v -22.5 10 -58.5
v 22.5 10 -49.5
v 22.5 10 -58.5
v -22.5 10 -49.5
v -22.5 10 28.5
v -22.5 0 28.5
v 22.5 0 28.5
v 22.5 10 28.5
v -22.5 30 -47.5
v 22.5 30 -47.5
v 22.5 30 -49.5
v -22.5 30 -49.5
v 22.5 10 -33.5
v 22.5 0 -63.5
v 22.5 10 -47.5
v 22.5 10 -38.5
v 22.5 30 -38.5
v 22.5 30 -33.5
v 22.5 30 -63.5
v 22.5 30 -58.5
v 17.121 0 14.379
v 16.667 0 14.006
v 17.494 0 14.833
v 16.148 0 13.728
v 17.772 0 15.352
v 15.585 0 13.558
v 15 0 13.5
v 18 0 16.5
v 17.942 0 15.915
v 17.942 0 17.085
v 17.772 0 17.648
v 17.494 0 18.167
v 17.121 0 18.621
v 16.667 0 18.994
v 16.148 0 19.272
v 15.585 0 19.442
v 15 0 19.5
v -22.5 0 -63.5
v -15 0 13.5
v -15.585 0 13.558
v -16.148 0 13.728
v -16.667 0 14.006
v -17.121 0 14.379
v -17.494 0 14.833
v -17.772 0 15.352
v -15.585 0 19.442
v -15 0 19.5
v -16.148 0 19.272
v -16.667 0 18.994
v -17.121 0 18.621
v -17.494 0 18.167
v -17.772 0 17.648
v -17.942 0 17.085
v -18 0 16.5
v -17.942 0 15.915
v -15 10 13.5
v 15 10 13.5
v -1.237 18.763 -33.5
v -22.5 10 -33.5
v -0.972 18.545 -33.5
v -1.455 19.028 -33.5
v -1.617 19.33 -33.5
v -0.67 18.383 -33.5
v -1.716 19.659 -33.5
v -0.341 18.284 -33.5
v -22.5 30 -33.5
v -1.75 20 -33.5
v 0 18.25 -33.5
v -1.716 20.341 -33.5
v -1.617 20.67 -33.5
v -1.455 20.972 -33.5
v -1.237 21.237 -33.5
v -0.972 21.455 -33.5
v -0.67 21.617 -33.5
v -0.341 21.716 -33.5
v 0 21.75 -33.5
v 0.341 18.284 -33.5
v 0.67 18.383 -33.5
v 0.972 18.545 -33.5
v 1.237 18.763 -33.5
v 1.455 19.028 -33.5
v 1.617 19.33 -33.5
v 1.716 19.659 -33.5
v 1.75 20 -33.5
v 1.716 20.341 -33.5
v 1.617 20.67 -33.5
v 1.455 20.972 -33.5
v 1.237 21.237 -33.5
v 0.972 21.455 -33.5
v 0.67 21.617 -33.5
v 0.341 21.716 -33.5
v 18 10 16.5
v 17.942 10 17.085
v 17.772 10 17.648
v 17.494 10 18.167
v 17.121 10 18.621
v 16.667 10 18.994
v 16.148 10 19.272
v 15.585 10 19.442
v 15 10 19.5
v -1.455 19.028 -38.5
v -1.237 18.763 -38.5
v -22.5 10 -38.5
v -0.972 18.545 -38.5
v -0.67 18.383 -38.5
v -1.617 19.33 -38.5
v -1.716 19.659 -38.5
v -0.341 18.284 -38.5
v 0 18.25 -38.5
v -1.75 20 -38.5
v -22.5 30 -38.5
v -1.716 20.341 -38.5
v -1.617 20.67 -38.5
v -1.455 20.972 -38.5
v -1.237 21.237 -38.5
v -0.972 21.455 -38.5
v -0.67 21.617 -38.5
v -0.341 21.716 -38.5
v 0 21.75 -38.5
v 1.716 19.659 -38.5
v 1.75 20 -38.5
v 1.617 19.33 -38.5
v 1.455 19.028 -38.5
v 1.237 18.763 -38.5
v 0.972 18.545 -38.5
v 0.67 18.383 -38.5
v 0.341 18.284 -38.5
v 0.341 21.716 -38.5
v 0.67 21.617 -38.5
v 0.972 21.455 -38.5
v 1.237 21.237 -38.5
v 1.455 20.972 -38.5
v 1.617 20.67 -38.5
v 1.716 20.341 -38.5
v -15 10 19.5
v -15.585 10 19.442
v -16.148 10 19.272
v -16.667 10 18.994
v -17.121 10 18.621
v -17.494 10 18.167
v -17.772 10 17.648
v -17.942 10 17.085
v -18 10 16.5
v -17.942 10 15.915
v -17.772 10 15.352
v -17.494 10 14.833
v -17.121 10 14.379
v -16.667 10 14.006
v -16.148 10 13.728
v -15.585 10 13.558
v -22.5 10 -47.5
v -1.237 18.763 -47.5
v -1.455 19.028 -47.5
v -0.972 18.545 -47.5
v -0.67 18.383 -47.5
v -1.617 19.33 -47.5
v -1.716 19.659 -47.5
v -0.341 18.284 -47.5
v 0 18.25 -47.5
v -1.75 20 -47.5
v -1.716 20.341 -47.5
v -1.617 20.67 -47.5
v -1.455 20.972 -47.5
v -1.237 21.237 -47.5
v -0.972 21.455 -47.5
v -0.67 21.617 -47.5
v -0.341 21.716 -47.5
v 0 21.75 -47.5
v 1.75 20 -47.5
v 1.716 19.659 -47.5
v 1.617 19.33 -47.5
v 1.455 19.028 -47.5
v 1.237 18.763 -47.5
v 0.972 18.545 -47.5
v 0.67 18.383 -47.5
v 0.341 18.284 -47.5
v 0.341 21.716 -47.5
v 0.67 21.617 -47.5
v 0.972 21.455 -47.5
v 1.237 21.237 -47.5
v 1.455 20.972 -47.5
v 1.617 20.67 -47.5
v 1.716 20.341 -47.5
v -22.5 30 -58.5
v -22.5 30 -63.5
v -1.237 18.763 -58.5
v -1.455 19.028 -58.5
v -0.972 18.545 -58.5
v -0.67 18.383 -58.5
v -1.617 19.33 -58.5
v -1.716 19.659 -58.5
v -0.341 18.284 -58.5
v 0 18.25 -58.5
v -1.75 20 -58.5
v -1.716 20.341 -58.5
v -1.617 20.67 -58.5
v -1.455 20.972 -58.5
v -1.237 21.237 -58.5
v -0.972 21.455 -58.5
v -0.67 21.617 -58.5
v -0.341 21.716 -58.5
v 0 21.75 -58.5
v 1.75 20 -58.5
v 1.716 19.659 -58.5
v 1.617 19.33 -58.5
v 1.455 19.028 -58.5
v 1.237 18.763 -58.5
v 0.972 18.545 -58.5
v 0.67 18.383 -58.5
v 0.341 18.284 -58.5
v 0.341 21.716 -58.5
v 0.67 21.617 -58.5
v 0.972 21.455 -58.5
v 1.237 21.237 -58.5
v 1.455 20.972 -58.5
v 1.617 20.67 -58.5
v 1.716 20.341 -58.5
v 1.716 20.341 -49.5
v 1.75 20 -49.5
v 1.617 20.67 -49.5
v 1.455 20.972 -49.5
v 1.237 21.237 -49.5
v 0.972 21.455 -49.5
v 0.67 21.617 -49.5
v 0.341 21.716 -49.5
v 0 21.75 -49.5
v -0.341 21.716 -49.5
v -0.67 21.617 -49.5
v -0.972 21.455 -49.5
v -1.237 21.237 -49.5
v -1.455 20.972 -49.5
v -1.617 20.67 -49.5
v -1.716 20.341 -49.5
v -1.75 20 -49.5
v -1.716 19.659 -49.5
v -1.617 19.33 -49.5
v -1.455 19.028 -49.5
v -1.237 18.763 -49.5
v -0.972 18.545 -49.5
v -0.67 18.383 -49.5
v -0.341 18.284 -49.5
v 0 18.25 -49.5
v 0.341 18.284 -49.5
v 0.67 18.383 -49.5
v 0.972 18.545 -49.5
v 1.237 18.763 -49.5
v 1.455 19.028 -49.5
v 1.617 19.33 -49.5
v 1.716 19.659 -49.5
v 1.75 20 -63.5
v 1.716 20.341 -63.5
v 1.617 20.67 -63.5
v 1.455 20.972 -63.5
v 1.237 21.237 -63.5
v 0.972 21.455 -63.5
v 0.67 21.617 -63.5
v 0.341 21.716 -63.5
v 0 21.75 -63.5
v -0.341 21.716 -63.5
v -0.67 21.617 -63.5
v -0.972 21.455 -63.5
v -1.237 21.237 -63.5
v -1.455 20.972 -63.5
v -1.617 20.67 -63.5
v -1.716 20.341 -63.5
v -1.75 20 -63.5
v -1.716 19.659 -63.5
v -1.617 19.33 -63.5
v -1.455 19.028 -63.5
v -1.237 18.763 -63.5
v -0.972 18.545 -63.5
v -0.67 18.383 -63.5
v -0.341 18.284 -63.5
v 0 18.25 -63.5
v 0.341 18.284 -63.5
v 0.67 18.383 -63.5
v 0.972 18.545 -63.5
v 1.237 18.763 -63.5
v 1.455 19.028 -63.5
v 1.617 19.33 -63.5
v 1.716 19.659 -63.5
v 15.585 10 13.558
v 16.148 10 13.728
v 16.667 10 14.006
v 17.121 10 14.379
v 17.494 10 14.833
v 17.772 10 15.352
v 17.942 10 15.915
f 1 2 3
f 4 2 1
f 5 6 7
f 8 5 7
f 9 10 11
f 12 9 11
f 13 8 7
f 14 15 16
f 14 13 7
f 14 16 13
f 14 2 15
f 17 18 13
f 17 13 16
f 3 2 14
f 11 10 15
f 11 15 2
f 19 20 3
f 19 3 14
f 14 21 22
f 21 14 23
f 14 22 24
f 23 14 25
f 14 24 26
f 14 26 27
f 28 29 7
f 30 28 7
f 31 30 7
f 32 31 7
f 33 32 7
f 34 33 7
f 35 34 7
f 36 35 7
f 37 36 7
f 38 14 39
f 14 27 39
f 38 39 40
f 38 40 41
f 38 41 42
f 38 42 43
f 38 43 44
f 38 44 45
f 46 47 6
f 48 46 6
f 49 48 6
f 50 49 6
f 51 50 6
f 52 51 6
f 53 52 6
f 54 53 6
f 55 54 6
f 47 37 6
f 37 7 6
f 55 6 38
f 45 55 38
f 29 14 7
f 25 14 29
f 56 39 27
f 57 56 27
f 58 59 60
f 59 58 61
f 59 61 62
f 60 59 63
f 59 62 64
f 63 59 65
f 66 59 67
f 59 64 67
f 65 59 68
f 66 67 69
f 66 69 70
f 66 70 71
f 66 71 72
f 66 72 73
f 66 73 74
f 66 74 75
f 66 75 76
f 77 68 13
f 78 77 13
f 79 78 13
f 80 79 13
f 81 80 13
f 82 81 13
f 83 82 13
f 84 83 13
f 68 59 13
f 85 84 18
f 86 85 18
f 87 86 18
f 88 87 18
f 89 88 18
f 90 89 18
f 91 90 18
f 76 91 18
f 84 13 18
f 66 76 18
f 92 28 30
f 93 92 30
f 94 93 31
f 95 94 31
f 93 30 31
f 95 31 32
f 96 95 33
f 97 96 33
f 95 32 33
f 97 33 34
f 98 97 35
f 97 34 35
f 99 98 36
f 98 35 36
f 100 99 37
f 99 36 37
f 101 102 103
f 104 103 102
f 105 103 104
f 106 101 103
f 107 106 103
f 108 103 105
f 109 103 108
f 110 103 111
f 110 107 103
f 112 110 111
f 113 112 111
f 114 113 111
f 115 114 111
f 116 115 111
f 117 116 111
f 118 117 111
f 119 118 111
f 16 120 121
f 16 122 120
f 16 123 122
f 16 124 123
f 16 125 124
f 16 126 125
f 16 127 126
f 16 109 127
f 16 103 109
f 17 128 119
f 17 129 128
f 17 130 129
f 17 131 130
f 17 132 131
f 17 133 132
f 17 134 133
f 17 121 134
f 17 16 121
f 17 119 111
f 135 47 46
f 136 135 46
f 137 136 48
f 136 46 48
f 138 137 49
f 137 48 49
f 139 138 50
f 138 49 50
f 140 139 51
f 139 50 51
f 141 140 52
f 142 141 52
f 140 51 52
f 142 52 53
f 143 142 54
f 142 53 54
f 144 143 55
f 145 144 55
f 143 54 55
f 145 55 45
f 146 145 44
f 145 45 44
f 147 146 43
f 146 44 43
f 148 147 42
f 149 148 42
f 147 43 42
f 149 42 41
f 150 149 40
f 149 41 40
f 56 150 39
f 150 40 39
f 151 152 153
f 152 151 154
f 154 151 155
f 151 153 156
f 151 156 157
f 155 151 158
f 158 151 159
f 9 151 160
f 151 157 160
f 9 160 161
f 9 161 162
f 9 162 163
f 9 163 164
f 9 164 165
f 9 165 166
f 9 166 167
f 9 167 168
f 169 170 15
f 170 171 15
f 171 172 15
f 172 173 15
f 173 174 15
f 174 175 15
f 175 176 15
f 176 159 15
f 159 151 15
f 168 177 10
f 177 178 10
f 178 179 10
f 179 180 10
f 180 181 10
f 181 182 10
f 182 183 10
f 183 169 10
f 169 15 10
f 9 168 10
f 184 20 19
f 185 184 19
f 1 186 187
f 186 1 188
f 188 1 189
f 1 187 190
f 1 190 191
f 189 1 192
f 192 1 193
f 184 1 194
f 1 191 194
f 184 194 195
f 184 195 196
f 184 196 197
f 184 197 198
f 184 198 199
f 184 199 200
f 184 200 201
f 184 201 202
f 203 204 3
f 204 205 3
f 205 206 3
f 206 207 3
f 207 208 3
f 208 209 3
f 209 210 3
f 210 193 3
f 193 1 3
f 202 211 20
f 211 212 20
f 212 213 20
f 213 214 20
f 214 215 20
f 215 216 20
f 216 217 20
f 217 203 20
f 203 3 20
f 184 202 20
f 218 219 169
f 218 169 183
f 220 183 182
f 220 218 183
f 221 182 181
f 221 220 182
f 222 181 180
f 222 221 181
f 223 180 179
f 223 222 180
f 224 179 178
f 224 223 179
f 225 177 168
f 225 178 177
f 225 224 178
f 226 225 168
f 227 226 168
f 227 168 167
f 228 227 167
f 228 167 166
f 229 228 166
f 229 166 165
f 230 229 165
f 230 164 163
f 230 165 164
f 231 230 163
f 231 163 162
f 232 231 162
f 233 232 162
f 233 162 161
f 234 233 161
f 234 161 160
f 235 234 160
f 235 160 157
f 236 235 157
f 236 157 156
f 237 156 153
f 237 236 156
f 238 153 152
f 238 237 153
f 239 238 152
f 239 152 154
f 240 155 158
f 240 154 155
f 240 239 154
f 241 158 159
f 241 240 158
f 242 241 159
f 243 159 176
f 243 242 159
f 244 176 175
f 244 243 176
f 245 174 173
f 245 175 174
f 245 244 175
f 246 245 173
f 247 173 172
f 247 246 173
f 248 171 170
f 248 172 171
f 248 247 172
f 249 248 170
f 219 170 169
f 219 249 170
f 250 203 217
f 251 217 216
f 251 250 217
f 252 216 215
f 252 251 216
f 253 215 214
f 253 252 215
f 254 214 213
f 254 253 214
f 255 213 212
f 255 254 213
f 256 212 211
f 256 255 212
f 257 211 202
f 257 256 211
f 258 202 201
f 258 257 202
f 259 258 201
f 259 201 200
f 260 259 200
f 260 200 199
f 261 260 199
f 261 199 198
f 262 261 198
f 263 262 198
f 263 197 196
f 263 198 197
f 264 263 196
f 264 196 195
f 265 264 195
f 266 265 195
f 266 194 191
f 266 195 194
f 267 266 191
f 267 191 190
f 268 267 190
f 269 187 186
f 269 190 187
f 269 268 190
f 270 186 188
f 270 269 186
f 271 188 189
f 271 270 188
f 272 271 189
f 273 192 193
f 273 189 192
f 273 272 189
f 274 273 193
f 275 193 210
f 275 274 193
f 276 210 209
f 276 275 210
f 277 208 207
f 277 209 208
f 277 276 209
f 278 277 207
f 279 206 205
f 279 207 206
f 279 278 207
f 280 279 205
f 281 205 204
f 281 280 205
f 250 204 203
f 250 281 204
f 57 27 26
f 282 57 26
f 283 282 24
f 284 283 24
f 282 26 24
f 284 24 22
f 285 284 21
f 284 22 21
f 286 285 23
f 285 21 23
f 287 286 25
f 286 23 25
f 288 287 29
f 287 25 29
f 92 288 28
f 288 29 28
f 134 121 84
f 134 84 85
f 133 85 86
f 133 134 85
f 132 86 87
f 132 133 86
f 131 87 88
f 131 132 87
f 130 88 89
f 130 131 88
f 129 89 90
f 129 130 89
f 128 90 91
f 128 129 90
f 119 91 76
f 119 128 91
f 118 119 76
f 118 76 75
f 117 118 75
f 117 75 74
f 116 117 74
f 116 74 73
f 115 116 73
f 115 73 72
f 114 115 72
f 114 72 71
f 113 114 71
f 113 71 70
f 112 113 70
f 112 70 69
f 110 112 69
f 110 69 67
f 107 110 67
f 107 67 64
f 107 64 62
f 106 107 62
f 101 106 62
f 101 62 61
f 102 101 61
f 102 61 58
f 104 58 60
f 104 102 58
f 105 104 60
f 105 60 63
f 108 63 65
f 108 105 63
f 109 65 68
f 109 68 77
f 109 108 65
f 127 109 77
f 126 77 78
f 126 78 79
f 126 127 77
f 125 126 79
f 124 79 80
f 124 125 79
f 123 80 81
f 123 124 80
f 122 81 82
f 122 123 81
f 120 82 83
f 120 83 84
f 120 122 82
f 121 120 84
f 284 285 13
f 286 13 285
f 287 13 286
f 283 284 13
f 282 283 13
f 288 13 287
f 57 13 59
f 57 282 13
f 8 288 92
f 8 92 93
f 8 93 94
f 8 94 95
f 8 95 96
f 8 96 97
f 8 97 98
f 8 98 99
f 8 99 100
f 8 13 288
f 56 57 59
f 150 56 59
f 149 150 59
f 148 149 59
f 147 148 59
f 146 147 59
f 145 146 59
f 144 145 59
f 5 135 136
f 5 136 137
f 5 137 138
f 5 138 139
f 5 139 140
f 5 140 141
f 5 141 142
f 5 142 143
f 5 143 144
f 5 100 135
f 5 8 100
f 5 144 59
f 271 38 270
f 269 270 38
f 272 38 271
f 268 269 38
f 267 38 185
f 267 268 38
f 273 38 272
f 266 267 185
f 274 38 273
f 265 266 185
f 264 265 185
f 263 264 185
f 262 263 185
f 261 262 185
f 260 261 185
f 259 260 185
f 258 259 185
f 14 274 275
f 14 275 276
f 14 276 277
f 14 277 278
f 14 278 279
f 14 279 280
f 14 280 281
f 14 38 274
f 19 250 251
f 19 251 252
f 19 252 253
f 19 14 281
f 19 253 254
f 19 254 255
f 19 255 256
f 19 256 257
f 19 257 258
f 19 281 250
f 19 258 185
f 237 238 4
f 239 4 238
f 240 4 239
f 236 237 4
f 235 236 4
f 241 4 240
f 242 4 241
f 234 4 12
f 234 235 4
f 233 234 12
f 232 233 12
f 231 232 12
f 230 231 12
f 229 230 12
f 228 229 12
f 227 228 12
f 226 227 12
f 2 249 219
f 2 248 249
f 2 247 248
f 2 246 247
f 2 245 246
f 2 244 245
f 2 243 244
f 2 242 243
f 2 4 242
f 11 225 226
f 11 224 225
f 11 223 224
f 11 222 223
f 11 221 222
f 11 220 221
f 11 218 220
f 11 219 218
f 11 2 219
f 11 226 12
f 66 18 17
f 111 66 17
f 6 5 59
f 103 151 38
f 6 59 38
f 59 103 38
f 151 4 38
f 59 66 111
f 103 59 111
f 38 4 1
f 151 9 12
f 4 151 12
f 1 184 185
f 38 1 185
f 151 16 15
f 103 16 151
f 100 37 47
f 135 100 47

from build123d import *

# Parameters (mm, degrees)
SKETCH1_W           = 45
SKETCH1_H           = 57
BOSS_EXTRUDE1_DEPTH = 10
SKETCH4_W           = 45
SKETCH4_H           = 10
BOSS_EXTRUDE4_DEPTH = 35
SKETCH5_W           = 5
SKETCH5_H           = 20
SKETCH5_W_2         = 2
BOSS_EXTRUDE5_DEPTH = 45
CUT_EXTRUDE1_START  = -30
SKETCH6_R           = 1.75
CUT_EXTRUDE1_DEPTH  = 30


with BuildPart() as part:
    # Sketch1 → Boss-Extrude1 (new body)
    with BuildSketch(Plane(origin=(0, 0, 0), x_dir=(1, 0, 0), z_dir=(0, 1, 0))):
        Rectangle(SKETCH1_W, SKETCH1_H)
        with BuildLine():
            ThreePointArc((-15, -19.5), (-18, -16.5), (-15, -13.5))
            Line((-15, -13.5), (15, -13.5))
            ThreePointArc((15, -13.5), (17.121320344, -14.378679656), (18, -16.5))
            ThreePointArc((18, -16.5), (17.121320344, -18.621320344), (15, -19.5))
            Line((15, -19.5), (-15, -19.5))
        make_face(mode=Mode.SUBTRACT)
    extrude(amount=BOSS_EXTRUDE1_DEPTH)

    # Sketch4 → Boss-Extrude4 (add)
    with BuildSketch(Plane(origin=(0, 0, -28.5), x_dir=(-1, 0, 0), z_dir=(0, 0, -1))):
        with Locations((0, 5)):
            Rectangle(SKETCH4_W, SKETCH4_H)
    extrude(amount=BOSS_EXTRUDE4_DEPTH)

    # Sketch5 → Boss-Extrude5 (add)
    with BuildSketch(Plane(origin=(22.5, 0, 0), x_dir=(0, 0, -1), z_dir=(1, 0, 0))):
        with Locations((36, 20)):
            Rectangle(SKETCH5_W, SKETCH5_H)
        with Locations((48.5, 20)):
            Rectangle(SKETCH5_W_2, SKETCH5_H)
        with Locations((61, 20)):
            Rectangle(SKETCH5_W, SKETCH5_H)
    extrude(amount=-BOSS_EXTRUDE5_DEPTH)

    # Sketch6 → Cut-Extrude1 (cut)
    with BuildSketch(Plane.XY.offset(-33.5).offset(CUT_EXTRUDE1_START)):
        with Locations((0, 20)):
            Circle(SKETCH6_R)
    extrude(amount=CUT_EXTRUDE1_DEPTH, mode=Mode.SUBTRACT)


solid = part.part
